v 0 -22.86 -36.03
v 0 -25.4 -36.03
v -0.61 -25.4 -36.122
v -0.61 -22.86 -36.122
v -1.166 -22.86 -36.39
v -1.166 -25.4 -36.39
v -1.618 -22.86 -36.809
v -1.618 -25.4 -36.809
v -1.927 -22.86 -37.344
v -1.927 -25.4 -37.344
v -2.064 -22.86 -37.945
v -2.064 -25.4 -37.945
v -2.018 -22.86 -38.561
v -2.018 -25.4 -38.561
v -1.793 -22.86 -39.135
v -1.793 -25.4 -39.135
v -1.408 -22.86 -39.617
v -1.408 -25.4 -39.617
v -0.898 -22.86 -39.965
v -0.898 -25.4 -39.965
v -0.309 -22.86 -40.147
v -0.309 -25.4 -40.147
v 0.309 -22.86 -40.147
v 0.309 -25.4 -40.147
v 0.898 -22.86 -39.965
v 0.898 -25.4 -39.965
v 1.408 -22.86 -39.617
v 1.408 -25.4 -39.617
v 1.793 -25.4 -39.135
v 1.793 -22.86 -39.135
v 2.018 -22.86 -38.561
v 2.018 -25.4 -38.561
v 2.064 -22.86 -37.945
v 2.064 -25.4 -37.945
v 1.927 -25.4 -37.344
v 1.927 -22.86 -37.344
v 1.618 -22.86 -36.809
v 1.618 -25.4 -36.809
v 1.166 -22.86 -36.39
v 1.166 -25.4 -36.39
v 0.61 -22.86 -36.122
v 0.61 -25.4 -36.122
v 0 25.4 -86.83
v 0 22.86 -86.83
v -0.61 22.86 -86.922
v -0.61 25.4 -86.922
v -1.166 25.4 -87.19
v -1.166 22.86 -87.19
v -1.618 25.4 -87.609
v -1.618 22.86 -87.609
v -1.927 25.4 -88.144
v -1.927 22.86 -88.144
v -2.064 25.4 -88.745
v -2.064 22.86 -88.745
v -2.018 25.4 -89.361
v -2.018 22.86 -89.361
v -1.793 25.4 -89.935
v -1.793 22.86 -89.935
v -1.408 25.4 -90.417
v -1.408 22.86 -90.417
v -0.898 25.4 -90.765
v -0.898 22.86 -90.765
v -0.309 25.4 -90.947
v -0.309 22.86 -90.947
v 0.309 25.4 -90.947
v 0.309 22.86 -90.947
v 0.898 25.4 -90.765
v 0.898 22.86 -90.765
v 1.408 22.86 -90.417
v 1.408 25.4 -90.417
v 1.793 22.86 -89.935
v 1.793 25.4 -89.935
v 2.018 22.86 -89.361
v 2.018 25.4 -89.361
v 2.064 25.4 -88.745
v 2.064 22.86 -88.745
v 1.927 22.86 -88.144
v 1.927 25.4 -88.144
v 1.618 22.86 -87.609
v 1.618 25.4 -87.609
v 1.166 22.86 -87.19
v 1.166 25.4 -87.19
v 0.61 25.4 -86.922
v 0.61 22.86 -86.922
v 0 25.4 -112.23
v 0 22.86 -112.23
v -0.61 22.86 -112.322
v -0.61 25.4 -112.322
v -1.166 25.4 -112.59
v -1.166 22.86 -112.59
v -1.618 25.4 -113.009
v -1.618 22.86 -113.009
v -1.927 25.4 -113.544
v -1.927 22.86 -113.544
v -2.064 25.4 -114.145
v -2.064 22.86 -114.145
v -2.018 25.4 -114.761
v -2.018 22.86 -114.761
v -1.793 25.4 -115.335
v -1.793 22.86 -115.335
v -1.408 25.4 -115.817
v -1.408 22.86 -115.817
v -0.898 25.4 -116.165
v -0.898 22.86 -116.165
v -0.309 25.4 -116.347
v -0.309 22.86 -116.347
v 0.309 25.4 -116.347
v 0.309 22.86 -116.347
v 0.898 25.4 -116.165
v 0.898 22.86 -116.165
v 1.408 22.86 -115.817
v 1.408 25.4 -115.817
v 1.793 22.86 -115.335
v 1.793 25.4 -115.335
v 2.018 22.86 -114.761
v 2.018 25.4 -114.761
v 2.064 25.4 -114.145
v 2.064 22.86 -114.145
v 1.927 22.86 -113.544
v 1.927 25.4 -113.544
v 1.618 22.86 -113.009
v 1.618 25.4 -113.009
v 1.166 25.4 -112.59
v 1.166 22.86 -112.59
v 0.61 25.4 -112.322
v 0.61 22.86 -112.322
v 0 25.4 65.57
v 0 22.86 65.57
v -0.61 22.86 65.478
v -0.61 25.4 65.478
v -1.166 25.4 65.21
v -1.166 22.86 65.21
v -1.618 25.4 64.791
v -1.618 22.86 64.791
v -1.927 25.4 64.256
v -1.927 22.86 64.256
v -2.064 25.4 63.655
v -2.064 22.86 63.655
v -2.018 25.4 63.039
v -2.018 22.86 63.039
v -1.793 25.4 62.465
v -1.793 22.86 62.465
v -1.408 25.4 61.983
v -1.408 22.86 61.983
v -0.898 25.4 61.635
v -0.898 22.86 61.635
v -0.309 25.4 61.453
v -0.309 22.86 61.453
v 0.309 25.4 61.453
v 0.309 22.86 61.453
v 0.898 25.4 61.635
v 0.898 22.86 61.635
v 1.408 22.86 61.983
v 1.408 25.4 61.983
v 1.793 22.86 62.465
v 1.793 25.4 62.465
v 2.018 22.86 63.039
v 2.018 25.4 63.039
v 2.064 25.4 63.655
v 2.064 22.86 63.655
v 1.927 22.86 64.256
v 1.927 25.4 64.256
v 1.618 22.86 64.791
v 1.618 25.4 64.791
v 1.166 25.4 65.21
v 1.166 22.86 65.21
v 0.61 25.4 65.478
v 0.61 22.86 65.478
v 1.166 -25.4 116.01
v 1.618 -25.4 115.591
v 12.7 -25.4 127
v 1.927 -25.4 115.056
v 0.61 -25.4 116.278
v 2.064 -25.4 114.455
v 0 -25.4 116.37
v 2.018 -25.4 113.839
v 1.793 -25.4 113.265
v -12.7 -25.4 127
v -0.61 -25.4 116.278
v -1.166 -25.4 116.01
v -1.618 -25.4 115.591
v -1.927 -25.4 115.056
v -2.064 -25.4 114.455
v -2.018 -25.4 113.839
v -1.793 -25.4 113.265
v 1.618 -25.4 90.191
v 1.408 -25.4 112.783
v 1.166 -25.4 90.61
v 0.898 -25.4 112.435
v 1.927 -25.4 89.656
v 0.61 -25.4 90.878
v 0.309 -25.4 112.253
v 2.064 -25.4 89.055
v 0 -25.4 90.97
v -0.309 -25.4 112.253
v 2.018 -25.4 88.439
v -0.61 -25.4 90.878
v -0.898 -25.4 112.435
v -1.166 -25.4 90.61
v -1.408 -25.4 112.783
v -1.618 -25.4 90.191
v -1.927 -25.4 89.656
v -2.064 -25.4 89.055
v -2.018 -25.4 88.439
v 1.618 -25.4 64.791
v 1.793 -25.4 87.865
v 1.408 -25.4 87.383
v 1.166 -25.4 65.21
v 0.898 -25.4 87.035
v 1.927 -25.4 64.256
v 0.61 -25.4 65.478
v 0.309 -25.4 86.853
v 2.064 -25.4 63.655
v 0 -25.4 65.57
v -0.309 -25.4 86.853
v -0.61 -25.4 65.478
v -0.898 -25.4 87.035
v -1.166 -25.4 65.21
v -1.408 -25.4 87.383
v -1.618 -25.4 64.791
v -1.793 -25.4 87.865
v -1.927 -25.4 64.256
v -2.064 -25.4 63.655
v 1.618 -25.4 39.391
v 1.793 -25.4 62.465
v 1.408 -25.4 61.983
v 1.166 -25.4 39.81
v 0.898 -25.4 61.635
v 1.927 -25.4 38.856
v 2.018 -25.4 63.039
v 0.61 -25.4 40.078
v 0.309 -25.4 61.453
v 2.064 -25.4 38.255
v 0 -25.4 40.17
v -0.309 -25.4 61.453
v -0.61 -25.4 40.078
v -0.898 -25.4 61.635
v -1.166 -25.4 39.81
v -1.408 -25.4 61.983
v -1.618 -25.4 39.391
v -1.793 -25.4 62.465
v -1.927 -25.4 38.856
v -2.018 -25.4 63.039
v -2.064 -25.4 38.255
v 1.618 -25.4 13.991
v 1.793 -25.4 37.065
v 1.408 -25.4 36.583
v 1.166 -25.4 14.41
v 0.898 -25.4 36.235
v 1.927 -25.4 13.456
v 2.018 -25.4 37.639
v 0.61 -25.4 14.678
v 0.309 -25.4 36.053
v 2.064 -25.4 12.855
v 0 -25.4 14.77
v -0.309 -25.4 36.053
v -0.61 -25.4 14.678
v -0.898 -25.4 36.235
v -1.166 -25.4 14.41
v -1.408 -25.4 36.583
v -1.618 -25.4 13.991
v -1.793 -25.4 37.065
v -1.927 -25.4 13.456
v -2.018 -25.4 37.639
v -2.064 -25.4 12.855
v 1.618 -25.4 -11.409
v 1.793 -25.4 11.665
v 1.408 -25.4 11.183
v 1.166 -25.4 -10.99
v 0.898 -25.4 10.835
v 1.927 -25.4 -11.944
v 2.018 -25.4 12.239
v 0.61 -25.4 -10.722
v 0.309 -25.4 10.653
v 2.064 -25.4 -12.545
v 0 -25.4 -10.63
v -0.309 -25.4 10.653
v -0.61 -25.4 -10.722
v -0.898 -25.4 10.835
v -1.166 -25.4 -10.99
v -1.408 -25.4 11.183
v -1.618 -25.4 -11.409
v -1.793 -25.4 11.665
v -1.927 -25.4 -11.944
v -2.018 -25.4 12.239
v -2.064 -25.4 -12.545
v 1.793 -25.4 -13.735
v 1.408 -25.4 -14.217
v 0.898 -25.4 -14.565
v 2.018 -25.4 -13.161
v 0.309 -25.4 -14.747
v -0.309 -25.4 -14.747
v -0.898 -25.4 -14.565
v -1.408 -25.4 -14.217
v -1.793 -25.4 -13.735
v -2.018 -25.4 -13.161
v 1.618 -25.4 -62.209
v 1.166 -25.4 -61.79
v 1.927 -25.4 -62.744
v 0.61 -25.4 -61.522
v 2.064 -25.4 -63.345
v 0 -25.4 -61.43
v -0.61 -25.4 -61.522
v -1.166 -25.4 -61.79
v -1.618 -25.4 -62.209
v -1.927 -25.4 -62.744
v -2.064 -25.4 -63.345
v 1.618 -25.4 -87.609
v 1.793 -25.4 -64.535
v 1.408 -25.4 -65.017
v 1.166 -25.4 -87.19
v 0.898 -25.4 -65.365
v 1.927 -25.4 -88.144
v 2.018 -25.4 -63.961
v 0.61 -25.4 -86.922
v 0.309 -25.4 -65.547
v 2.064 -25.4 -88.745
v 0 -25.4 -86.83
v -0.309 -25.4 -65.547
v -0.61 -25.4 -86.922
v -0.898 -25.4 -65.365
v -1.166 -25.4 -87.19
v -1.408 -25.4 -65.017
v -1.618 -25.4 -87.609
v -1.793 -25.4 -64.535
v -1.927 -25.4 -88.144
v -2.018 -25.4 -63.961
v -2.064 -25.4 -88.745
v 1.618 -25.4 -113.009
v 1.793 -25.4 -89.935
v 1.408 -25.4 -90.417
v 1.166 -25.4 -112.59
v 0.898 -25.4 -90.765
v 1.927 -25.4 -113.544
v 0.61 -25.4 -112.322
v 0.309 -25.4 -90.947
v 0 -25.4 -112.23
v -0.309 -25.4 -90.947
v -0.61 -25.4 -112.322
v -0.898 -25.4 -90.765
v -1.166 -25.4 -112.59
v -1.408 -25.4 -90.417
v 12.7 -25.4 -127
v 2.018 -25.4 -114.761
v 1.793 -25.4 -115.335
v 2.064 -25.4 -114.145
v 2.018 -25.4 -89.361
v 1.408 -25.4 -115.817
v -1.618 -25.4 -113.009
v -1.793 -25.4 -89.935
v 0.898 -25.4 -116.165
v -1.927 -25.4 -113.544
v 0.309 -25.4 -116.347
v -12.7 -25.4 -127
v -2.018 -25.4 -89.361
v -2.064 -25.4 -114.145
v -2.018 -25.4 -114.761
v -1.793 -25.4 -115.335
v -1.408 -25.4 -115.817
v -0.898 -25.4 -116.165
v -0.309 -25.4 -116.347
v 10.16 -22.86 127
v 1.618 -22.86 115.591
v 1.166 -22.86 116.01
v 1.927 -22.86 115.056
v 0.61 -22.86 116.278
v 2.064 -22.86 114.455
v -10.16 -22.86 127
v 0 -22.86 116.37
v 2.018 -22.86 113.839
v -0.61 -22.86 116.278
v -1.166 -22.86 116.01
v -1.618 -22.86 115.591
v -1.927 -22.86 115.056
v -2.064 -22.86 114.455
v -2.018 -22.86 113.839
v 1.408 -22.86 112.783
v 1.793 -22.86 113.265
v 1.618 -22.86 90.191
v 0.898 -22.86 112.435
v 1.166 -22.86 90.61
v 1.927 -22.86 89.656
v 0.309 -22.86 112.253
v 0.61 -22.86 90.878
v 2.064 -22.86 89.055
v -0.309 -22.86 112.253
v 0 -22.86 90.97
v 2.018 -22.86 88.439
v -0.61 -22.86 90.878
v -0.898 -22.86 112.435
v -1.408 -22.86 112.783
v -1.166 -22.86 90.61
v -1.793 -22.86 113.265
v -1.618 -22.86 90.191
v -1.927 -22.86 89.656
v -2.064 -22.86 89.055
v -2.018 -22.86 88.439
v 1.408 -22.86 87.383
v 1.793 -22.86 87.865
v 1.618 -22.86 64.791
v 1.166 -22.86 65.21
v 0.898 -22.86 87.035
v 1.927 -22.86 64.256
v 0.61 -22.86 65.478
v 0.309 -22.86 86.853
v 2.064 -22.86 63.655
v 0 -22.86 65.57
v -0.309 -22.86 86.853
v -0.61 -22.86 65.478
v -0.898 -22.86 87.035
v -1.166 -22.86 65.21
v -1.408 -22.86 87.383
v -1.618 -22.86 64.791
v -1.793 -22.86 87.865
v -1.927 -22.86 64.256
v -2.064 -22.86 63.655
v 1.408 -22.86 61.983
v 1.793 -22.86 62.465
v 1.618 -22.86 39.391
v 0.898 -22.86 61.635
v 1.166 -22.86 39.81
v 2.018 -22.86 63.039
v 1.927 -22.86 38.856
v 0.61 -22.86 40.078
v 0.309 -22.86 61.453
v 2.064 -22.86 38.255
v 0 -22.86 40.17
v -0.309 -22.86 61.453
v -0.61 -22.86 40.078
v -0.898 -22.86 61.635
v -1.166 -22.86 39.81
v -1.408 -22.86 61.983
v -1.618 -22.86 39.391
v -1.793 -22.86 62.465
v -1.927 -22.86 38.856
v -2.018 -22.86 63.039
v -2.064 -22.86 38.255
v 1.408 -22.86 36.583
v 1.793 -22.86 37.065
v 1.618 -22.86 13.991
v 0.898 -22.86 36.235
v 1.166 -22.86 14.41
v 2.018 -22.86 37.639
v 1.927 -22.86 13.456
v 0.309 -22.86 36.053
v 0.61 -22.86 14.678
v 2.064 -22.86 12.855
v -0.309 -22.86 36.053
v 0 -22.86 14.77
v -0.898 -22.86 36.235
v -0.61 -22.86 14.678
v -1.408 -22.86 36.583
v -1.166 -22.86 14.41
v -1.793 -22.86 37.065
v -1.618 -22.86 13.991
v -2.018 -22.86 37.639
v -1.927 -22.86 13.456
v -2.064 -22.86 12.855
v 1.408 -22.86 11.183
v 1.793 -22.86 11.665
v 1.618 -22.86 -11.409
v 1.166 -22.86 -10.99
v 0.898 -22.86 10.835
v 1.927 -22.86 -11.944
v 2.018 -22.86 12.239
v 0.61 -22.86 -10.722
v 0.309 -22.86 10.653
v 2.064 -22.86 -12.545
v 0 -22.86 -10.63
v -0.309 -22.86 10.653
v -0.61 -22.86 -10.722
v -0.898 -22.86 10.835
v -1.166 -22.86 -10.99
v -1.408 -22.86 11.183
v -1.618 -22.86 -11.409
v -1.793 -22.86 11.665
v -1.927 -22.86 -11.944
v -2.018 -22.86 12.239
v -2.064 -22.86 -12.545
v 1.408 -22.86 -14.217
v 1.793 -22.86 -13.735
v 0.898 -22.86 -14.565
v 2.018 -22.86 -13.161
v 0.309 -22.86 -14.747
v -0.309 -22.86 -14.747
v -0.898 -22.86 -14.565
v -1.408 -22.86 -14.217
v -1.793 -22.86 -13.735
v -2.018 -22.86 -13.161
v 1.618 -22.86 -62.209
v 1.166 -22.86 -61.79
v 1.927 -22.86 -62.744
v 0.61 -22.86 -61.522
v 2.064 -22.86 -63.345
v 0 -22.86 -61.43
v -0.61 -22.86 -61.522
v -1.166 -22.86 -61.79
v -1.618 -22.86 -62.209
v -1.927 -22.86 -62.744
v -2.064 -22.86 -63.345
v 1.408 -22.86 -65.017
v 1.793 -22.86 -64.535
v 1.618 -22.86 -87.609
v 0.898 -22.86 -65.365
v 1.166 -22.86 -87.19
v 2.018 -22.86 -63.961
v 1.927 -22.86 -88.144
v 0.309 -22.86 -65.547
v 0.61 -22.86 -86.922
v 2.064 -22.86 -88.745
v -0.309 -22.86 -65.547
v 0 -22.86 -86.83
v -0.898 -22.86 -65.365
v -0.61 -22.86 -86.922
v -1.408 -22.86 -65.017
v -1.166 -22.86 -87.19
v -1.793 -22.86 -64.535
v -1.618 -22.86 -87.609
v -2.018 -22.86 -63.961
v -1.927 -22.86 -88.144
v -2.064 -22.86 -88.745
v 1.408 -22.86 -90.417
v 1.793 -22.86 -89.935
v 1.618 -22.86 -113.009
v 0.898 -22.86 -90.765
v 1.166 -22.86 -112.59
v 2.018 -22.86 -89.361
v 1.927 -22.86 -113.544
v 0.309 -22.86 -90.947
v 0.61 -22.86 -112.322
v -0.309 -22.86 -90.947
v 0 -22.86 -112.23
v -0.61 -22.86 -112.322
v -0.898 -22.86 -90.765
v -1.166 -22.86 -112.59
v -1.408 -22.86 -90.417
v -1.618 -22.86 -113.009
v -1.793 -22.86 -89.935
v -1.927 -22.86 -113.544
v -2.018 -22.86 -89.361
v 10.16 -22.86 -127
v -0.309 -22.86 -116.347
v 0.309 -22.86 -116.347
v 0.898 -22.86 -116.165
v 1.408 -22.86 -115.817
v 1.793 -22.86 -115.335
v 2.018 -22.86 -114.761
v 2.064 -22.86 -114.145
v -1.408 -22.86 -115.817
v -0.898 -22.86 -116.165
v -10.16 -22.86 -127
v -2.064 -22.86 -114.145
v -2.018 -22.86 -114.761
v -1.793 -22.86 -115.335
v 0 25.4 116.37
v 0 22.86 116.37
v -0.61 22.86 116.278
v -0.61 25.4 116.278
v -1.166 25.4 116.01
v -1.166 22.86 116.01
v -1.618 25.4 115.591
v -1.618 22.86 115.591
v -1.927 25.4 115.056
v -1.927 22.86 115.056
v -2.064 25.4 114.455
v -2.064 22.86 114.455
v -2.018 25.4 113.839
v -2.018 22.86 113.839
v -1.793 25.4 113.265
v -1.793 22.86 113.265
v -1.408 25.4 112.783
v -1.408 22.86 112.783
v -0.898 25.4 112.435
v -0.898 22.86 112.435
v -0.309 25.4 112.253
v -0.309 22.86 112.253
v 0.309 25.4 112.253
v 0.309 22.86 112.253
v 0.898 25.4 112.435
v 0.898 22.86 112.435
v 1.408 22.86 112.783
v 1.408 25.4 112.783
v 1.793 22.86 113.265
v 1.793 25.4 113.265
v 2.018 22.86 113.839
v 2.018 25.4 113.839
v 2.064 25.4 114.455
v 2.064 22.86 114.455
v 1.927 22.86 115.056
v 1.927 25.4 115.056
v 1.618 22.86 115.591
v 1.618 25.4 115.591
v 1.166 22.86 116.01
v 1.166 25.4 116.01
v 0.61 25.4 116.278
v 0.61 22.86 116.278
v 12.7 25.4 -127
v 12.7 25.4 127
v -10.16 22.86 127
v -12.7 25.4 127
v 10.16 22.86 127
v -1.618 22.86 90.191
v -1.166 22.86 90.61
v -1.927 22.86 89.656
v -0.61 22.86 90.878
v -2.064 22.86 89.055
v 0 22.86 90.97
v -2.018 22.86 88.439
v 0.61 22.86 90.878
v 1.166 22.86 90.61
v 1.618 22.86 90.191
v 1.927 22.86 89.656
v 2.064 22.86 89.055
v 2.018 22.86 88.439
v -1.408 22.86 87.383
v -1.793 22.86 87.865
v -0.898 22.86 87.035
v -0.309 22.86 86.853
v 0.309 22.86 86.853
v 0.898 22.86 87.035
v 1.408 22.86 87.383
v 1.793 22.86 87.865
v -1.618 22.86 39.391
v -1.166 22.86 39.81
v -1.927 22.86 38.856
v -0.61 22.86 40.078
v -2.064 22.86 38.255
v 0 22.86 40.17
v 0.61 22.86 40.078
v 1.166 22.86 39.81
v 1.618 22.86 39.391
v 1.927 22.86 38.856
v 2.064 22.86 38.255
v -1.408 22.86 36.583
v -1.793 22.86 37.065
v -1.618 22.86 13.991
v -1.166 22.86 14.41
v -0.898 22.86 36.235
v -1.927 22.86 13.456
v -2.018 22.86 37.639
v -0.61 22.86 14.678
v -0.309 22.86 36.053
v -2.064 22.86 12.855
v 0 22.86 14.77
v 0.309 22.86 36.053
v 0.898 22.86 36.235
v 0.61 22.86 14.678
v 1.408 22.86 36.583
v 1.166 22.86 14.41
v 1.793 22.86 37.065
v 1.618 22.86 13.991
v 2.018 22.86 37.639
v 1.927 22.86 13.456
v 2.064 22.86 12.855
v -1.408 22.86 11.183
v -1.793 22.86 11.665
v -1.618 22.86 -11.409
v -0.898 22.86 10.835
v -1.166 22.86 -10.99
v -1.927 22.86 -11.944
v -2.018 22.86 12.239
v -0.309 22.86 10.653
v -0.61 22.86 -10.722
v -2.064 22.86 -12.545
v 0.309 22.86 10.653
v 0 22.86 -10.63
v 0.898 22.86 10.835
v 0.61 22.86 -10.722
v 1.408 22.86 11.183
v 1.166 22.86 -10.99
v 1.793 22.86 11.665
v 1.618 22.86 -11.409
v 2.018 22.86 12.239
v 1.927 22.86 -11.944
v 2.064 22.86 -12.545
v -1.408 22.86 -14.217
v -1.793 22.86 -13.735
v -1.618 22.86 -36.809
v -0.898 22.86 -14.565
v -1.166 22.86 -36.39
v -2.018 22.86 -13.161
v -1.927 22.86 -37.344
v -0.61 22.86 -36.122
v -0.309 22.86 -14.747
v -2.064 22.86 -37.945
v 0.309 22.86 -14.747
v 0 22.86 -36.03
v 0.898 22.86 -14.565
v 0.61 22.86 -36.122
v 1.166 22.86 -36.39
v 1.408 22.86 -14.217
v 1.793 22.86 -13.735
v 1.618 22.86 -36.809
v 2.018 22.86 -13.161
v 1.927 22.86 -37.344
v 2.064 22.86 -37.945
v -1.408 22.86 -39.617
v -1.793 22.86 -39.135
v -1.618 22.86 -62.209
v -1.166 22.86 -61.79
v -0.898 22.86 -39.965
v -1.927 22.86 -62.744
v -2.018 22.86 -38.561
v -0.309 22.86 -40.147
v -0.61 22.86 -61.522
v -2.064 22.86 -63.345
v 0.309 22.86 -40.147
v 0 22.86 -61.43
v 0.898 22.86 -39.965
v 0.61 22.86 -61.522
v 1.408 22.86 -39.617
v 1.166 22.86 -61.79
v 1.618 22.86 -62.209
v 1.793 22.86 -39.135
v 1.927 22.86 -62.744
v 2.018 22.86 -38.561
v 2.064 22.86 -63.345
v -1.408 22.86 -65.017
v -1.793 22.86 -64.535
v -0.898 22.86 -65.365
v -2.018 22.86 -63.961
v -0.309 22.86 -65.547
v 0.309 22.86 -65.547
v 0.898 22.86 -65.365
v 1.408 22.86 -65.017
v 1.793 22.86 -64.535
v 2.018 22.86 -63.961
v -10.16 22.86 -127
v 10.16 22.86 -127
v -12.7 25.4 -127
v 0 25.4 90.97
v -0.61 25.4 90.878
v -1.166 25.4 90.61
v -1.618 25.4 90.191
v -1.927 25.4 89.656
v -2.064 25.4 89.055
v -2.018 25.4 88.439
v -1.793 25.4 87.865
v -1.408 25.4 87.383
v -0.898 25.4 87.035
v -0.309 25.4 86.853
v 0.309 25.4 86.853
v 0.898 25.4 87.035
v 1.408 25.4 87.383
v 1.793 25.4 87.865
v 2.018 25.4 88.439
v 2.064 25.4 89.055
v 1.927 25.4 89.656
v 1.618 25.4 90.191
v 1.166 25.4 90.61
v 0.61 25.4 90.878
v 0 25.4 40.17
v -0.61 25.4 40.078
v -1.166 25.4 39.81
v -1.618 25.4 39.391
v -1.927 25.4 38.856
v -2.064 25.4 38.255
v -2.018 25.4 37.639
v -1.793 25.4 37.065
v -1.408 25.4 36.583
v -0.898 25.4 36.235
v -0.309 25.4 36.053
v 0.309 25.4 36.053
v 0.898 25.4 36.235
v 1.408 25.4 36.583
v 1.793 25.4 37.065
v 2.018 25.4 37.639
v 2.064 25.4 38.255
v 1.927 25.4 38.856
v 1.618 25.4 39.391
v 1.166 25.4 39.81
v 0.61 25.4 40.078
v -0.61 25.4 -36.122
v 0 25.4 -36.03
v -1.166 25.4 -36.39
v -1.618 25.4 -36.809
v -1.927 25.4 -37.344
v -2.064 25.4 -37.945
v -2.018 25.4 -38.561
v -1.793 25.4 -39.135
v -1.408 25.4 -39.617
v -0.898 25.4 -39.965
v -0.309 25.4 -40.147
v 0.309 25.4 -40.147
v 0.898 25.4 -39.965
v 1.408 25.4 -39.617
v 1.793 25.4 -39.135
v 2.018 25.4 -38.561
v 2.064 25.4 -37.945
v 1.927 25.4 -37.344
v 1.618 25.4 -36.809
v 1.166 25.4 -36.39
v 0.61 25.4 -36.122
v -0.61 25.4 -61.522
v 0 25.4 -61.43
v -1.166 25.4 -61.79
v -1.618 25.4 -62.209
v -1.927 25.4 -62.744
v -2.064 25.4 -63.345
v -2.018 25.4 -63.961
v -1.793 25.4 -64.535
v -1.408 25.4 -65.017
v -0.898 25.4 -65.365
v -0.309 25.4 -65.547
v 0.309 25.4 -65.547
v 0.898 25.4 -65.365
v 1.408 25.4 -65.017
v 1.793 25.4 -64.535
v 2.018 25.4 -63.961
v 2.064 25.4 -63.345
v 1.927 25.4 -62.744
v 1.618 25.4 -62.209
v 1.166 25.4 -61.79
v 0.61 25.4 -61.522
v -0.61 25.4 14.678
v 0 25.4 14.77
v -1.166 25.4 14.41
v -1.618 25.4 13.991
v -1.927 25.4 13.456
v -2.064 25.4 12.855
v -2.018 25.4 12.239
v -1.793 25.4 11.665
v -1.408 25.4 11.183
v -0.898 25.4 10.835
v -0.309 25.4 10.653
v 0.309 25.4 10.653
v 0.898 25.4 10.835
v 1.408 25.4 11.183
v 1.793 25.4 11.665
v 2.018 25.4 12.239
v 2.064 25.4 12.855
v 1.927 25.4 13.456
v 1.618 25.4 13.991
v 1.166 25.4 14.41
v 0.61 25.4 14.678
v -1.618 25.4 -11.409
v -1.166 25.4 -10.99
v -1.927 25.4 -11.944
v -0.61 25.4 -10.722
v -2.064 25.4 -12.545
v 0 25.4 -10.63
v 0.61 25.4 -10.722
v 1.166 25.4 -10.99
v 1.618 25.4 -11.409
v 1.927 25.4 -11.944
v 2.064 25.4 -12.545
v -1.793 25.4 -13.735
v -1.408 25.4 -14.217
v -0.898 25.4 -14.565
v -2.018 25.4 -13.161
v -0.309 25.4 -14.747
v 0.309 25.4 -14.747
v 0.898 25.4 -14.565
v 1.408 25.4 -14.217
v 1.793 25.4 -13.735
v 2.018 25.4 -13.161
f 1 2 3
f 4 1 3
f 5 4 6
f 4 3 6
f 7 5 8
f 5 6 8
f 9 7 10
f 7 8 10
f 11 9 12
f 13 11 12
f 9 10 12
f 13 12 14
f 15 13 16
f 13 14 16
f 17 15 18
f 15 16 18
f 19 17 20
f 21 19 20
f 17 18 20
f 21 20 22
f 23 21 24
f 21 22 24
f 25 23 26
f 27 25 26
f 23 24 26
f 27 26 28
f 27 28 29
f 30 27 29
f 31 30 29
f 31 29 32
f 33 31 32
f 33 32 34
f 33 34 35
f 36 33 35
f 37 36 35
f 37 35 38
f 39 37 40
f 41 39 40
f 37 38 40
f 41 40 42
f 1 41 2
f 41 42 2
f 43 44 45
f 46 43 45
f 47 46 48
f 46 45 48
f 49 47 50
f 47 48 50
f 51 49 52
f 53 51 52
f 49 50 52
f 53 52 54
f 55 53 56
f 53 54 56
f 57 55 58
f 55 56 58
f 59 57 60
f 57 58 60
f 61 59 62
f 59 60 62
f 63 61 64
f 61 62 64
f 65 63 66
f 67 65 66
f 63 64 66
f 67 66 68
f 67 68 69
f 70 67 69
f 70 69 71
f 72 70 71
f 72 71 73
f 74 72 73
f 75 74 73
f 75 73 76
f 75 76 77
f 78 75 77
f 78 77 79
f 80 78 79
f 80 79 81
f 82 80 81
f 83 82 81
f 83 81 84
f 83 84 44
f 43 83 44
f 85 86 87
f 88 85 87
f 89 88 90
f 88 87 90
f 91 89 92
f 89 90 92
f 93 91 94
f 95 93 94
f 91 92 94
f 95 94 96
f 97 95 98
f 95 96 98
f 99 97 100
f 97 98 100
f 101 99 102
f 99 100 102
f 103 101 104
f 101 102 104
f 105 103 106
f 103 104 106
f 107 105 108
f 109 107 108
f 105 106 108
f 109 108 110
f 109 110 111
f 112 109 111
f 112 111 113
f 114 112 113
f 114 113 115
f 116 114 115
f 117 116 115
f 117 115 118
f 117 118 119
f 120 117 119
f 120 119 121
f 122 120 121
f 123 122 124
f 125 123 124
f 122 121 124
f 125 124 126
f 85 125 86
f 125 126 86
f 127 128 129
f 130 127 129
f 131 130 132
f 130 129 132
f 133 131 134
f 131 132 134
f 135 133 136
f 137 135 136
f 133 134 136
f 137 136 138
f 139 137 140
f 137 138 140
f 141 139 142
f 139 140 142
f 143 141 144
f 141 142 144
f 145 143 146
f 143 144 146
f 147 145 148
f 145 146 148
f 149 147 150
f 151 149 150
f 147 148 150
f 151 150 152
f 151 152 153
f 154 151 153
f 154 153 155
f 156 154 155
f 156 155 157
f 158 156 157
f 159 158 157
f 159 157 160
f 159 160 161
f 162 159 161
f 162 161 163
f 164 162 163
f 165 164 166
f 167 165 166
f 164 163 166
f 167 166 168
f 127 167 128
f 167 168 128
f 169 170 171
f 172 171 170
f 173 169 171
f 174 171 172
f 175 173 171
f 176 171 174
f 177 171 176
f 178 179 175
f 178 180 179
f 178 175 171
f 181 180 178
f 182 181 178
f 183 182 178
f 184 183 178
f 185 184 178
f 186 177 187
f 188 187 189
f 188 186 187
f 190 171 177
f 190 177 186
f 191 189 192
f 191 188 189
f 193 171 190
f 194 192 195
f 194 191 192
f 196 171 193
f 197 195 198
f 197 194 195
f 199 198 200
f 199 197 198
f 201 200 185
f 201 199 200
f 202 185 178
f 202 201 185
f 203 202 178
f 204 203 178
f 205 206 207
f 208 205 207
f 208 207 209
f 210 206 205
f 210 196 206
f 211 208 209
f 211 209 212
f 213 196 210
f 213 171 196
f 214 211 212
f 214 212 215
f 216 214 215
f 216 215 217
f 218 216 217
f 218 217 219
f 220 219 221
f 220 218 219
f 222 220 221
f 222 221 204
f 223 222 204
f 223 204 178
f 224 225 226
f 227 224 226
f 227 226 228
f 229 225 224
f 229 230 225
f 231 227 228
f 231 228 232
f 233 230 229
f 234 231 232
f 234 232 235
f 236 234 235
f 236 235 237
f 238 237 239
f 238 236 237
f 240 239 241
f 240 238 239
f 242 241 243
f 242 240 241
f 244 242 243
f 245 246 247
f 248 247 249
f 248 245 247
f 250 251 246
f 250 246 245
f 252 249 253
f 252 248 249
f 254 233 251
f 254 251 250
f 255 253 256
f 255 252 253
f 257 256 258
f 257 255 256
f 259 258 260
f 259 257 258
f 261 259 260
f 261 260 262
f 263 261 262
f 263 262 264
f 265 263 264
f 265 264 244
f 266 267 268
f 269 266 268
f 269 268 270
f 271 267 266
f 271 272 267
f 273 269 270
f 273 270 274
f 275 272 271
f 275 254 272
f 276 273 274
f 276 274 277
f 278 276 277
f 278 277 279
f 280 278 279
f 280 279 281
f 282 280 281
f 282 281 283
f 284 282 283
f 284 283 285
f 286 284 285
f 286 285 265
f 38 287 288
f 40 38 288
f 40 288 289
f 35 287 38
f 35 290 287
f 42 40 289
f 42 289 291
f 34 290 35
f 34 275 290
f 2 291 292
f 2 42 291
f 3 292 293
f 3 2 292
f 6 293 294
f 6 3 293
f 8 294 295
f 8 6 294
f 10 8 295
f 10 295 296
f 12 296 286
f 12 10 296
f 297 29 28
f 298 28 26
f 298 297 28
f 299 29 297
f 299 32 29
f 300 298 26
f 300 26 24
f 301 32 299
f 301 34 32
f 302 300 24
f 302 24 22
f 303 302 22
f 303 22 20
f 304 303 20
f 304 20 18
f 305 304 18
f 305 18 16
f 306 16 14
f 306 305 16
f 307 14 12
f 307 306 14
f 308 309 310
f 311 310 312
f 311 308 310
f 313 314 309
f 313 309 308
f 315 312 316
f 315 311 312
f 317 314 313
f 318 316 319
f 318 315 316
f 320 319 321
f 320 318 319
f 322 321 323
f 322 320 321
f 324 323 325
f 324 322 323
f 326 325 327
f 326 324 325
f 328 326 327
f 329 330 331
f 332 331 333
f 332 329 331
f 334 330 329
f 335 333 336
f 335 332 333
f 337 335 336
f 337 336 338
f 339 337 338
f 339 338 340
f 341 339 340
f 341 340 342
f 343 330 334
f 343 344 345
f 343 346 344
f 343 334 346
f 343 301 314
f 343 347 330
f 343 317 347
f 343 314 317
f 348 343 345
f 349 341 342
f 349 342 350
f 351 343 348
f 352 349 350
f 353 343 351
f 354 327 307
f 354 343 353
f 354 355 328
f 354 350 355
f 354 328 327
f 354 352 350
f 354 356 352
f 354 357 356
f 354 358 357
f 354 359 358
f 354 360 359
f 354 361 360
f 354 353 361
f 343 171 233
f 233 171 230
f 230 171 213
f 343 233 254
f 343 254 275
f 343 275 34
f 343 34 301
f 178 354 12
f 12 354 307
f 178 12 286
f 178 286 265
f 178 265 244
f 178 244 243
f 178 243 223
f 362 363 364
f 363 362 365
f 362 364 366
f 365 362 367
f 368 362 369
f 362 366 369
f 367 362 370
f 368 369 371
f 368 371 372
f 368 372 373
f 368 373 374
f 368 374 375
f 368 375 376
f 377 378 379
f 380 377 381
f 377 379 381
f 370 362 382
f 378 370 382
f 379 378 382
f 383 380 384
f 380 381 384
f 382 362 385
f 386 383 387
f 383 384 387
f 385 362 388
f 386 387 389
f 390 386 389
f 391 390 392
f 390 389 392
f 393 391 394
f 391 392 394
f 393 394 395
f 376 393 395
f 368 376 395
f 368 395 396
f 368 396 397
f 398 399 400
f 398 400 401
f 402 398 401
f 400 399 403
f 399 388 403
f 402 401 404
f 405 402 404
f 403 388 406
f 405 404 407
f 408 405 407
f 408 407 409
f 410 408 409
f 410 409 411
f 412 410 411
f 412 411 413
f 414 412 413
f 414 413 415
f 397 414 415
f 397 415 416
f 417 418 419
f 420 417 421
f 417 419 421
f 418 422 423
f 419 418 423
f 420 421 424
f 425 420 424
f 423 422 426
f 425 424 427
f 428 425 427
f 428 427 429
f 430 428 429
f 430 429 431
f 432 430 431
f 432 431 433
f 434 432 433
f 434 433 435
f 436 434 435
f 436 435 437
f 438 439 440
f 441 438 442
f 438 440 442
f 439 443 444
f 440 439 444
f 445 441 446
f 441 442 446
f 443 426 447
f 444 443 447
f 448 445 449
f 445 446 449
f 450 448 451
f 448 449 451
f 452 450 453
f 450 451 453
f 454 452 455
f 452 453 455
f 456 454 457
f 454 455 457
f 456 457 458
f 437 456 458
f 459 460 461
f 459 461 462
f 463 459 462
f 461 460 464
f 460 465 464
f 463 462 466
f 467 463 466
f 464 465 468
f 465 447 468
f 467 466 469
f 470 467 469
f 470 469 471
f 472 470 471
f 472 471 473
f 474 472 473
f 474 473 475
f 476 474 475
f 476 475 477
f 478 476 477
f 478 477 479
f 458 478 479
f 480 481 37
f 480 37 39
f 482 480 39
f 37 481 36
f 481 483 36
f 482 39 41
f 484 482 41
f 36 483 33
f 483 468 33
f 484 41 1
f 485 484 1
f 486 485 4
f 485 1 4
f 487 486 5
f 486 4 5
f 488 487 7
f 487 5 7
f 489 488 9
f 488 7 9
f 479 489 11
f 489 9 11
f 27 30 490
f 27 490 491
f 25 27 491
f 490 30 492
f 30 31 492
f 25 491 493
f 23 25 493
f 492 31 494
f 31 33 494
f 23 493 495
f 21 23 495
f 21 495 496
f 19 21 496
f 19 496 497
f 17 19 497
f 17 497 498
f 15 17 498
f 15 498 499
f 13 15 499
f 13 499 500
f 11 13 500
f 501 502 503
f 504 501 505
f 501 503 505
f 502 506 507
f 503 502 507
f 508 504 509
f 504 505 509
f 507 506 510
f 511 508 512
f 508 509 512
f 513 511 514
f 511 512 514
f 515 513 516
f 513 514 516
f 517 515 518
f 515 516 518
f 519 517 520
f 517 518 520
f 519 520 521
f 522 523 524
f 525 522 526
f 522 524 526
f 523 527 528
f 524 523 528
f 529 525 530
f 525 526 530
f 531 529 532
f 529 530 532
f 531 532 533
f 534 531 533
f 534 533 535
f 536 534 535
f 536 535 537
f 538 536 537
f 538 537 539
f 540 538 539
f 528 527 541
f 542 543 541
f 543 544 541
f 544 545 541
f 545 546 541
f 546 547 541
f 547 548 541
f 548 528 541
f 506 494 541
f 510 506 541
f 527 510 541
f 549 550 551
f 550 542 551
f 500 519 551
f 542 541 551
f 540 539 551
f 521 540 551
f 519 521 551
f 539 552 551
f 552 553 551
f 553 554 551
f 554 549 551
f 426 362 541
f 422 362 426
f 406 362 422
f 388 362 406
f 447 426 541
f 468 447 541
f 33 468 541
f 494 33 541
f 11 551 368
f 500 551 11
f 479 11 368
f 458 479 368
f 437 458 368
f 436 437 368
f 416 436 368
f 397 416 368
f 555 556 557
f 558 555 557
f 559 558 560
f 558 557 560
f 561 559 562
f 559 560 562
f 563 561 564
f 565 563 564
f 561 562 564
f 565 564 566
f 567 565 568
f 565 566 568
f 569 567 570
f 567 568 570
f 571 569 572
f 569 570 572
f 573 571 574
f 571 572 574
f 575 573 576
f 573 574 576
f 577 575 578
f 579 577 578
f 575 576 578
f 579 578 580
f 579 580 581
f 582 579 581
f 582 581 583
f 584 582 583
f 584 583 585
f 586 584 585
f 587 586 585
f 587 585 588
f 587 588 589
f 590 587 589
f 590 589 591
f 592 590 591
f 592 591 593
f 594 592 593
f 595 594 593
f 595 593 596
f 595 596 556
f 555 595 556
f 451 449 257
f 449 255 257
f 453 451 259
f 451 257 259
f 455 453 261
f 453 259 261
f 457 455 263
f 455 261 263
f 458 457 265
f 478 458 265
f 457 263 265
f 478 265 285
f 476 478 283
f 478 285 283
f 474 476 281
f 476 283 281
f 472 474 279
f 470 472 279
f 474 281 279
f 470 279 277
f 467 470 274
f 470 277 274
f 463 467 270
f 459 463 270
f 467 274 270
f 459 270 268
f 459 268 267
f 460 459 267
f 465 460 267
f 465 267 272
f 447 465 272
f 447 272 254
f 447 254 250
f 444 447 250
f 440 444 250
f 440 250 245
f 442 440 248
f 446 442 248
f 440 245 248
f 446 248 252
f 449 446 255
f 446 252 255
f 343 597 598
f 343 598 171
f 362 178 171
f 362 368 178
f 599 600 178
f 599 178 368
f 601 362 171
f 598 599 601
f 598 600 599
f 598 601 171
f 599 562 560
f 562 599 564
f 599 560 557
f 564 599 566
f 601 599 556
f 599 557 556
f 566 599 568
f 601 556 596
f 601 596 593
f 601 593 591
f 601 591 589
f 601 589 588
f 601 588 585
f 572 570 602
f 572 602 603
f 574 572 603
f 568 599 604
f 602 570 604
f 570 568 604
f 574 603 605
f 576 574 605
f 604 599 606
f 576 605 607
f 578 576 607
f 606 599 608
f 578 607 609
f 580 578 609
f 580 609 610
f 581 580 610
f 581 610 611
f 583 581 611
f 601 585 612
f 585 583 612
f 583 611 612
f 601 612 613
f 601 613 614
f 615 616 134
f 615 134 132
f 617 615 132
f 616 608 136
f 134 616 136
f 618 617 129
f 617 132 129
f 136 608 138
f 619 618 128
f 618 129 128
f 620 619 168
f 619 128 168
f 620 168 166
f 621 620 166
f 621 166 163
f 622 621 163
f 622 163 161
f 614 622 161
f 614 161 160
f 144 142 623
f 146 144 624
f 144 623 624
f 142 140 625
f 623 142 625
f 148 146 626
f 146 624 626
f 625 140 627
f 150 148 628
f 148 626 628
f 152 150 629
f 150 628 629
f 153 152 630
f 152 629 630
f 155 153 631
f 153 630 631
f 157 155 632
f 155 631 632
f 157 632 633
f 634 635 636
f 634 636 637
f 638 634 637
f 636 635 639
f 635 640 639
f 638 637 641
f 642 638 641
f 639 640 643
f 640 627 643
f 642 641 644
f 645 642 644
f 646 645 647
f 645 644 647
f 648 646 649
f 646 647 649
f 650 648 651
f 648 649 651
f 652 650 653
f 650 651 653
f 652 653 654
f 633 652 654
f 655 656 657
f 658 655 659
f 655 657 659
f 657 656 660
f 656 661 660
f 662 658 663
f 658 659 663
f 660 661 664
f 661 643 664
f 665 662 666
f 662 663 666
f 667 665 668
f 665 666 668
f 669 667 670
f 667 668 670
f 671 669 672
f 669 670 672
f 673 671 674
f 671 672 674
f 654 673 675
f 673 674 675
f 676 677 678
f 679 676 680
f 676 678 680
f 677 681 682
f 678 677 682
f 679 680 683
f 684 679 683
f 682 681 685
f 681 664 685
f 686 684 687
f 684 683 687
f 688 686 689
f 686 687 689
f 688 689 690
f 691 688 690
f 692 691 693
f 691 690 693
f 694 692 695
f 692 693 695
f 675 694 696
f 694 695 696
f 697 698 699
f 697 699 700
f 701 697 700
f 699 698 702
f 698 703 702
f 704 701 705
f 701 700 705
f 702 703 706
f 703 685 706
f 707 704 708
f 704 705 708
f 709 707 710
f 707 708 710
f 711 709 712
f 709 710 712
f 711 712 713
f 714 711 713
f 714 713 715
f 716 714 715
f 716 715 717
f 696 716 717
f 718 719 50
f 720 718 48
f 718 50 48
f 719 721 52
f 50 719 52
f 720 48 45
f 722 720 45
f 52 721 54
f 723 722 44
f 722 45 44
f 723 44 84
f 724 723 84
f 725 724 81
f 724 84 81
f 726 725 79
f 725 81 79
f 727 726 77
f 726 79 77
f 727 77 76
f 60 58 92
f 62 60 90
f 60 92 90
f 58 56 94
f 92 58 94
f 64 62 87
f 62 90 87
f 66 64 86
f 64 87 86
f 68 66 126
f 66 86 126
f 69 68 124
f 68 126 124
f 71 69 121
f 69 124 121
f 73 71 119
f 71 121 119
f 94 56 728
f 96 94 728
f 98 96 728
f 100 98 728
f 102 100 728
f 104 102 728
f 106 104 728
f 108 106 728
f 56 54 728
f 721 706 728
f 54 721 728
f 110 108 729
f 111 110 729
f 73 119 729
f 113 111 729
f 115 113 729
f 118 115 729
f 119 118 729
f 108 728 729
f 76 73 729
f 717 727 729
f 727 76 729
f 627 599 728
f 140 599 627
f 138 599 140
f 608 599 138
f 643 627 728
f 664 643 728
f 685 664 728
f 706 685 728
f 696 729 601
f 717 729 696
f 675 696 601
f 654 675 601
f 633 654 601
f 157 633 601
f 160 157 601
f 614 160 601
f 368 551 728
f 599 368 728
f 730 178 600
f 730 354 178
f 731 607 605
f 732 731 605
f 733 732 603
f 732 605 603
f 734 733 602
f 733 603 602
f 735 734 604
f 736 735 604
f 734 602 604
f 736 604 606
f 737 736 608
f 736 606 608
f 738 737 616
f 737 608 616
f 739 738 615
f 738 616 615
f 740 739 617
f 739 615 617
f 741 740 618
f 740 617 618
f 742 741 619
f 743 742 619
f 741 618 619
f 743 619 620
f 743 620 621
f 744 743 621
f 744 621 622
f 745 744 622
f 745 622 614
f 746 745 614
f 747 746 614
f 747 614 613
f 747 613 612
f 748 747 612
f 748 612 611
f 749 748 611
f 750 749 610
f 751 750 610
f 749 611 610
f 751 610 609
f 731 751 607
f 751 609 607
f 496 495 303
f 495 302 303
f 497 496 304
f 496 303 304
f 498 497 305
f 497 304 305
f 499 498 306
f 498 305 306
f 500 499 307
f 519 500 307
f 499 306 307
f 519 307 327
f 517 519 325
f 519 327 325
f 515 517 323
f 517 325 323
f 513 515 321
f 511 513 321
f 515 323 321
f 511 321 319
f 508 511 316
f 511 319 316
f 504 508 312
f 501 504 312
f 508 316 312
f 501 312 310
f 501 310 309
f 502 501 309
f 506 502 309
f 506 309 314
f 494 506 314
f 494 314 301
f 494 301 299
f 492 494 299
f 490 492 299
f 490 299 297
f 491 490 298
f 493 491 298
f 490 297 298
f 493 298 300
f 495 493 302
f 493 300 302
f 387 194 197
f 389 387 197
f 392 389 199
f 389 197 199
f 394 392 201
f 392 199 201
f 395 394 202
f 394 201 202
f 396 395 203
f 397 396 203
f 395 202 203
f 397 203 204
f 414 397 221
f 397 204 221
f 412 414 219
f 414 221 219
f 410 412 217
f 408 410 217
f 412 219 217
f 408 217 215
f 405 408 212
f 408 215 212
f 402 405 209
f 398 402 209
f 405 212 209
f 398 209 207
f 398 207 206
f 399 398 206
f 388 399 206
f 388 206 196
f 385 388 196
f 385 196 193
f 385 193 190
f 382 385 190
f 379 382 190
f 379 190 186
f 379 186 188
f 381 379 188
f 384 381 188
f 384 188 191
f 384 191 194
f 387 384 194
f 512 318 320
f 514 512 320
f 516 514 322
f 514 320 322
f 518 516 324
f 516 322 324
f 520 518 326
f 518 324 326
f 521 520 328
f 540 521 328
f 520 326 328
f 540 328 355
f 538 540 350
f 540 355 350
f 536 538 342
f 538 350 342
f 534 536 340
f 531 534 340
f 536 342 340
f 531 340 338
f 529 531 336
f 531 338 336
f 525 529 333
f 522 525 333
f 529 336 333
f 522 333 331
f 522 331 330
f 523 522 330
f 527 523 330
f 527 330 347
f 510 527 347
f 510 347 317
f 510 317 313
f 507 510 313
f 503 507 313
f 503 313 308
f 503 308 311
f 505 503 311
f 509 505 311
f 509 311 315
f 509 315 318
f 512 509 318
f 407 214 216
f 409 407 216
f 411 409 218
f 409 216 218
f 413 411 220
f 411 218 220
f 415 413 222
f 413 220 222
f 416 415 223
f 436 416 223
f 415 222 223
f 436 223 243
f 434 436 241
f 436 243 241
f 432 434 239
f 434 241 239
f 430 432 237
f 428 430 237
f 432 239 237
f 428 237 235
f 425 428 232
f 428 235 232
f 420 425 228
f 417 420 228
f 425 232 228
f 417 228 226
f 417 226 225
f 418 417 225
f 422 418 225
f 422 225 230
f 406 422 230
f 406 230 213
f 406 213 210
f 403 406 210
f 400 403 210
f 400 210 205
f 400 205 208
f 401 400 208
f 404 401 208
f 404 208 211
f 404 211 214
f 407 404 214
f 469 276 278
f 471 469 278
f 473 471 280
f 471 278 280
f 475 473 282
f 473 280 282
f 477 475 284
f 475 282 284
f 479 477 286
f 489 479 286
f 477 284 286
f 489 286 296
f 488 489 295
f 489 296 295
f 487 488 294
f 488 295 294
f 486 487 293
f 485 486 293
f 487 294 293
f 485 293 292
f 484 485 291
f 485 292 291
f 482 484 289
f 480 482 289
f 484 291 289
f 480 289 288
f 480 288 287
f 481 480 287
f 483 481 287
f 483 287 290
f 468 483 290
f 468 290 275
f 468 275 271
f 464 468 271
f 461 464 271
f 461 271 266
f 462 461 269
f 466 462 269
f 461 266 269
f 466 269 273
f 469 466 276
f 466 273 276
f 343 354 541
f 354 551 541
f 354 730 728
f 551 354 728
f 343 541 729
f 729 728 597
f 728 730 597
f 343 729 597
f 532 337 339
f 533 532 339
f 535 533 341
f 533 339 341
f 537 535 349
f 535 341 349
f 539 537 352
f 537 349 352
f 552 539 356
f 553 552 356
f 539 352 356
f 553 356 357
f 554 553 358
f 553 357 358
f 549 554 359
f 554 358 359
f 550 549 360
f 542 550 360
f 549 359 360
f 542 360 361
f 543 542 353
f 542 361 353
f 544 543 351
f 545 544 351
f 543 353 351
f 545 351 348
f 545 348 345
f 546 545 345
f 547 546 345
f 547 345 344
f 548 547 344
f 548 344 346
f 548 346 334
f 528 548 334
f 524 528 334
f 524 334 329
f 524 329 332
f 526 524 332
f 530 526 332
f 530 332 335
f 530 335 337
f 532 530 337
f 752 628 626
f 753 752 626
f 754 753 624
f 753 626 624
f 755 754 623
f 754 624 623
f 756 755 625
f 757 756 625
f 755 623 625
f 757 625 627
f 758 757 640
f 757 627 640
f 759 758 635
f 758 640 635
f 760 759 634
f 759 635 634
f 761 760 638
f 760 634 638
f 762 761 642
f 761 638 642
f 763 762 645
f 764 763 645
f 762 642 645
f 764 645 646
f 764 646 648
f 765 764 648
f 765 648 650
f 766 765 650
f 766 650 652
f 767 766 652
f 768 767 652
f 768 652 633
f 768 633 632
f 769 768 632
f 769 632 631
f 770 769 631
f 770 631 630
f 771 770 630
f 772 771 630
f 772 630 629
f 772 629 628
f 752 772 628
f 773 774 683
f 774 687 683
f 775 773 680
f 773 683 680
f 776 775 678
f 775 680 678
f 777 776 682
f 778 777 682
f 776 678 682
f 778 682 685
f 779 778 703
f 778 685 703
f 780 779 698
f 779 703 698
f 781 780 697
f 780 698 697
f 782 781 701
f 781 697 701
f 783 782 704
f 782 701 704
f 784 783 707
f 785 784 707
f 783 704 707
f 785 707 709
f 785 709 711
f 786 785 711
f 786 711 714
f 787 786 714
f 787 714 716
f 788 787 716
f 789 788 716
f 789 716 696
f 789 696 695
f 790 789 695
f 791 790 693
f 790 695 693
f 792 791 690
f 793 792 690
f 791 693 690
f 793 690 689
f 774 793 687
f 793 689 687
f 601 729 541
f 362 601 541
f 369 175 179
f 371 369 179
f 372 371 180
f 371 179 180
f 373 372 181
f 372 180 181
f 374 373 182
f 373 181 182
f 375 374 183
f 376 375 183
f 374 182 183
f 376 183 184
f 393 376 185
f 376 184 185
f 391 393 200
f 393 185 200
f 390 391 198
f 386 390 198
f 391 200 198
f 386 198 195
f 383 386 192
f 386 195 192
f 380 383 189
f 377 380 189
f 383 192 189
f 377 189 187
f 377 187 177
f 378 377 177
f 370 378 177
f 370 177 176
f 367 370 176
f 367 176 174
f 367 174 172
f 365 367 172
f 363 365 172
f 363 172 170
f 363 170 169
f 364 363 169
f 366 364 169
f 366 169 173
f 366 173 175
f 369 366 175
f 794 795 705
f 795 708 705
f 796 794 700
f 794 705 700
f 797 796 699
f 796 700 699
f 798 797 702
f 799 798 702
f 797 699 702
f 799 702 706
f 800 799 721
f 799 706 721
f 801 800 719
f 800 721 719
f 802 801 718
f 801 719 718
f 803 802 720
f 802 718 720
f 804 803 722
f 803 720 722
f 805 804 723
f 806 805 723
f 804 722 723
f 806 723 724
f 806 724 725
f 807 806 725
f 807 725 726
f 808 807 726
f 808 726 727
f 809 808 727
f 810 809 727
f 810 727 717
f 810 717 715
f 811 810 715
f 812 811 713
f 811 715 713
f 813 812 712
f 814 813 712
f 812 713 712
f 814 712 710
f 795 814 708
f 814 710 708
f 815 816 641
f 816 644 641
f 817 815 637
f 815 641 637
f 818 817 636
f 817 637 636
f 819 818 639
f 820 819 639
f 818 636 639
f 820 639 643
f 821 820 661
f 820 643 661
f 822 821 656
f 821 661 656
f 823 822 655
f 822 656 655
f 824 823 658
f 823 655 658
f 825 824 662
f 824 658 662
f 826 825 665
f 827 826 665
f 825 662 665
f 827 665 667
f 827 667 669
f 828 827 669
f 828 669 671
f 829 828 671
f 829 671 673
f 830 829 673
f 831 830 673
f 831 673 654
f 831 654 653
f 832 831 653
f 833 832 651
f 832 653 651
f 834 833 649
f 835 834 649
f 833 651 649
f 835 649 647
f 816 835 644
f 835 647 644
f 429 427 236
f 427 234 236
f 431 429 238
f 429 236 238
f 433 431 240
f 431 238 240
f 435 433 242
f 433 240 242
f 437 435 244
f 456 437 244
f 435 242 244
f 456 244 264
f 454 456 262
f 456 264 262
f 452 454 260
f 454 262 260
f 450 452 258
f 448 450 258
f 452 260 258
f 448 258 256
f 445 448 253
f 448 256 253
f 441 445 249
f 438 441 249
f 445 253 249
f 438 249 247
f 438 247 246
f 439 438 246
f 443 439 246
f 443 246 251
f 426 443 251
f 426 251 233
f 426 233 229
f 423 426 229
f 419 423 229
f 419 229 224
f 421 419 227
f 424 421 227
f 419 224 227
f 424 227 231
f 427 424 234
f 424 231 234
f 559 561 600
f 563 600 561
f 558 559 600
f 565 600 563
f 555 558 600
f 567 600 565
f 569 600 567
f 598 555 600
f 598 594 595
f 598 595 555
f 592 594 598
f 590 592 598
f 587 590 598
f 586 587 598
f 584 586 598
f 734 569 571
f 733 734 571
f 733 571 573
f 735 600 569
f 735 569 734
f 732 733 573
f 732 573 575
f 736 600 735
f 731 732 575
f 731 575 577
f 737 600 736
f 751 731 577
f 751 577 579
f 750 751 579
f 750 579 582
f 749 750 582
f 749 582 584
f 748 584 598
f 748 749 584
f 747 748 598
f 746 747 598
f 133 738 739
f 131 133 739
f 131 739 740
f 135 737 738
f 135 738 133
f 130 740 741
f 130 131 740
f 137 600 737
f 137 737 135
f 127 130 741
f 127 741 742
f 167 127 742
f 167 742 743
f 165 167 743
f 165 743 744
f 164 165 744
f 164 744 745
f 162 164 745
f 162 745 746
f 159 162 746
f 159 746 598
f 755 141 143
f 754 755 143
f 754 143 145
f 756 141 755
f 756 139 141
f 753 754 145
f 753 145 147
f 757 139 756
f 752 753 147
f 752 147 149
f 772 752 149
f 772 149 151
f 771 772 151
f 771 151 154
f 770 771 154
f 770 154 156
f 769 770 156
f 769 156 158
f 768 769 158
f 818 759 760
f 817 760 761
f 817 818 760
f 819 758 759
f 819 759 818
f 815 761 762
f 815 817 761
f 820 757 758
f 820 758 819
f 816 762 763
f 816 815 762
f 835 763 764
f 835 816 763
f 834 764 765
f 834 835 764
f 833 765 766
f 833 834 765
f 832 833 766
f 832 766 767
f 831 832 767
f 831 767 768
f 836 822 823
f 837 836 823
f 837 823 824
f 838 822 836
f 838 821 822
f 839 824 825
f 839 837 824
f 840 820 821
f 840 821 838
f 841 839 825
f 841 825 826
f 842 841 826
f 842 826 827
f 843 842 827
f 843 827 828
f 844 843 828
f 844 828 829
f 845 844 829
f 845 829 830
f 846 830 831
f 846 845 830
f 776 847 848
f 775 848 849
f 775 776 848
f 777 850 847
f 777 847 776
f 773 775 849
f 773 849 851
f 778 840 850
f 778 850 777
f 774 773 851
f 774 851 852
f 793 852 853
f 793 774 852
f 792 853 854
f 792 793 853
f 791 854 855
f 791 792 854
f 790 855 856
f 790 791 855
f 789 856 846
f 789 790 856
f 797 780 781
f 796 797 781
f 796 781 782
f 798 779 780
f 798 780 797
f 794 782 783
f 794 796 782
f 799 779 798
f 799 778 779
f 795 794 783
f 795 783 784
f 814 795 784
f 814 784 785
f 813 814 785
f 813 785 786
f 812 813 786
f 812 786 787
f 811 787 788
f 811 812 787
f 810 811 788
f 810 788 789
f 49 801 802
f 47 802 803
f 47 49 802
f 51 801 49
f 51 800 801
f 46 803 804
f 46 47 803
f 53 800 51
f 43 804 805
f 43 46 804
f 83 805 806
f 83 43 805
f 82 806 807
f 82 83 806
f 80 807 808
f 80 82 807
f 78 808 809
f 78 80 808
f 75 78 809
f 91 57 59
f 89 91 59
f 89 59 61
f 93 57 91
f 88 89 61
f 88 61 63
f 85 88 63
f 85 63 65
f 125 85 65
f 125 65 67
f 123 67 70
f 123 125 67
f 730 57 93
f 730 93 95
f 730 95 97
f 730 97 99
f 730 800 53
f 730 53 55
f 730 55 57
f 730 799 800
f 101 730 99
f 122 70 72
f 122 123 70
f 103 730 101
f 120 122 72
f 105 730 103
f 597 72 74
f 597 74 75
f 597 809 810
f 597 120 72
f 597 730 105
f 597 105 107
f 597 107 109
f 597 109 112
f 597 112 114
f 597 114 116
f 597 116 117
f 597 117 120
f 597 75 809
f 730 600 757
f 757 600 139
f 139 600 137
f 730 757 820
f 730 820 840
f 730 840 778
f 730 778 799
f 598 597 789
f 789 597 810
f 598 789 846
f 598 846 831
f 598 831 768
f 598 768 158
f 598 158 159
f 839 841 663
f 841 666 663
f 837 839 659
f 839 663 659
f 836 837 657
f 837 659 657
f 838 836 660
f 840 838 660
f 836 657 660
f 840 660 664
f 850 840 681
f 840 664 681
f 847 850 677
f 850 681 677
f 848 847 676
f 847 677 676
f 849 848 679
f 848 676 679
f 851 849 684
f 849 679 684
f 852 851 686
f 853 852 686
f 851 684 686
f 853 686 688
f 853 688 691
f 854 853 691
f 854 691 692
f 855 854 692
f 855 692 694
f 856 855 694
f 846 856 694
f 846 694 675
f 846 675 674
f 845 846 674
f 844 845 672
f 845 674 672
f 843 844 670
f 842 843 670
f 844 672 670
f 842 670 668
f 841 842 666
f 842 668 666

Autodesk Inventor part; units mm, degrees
ref_plane "YZ Plane" through (0, 0, 0) normal (1, 0, 0) x (0, 1, 0)
ref_plane "XZ Plane" through (0, 0, 0) normal (0, 1, 0) x (-1, 0, 0)
ref_plane "XY Plane" through (0, 0, 0) normal (0, 0, 1) x (1, 0, 0)
sketch "Sketch1" plane through (0, 0, 0) normal (0, 0, 1) x (1, 0, 0)
  line L0 (12.7, -25.4) -> (-12.7, -25.4)
  line L1 (-12.7, -25.4) -> (-12.7, 25.4)
  line L2 (-12.7, 25.4) -> (12.7, 25.4)
  line L3 (12.7, 25.4) -> (12.7, -25.4)
  line L4 (12.7, -25.4) -> (-12.7, 25.4) construction
  line L5 (-12.7, -25.4) -> (12.7, 25.4) construction
  line L6 (10.16, -22.86) -> (-10.16, -22.86)
  line L7 (-10.16, -22.86) -> (-10.16, 22.86)
  line L8 (-10.16, 22.86) -> (10.16, 22.86)
  line L9 (10.16, 22.86) -> (10.16, -22.86)
  line L10 (10.16, -22.86) -> (-10.16, 22.86) construction
  line L11 (-10.16, -22.86) -> (10.16, 22.86) construction
  point P0 (0, 0)
  dimension "d0" = 25.4
  dimension "d1" = 50.8
  dimension "d2" = 20.32
  dimension "d3" = 45.72
extrude "Extrusion1" add sketch "Sketch1" along normal mid plane 254
sketch "Sketch2" plane through (-12.7, 25.4, 127) normal (0, 1, 0) x (1, 0, 0)
  line L0 (0, 0) -> (0, 254) projected
  line L1 (25.4, 0) -> (0, 0) projected
  point P0 (12.7, 127)
  point P1 (12.7, 12.7)
  dimension "d6" = 12.7
  dimension "d7" = 12.7
hole "Hole1" at (0, 25.4, 114.3) direction (0, -1, 0) diameter 4.1402 end through all
pattern_linear "Rectangular Pattern1" count 10 spacing 25.4 along (0, 0, -1) of "Hole1"
properties part number "Intake_vertical"
